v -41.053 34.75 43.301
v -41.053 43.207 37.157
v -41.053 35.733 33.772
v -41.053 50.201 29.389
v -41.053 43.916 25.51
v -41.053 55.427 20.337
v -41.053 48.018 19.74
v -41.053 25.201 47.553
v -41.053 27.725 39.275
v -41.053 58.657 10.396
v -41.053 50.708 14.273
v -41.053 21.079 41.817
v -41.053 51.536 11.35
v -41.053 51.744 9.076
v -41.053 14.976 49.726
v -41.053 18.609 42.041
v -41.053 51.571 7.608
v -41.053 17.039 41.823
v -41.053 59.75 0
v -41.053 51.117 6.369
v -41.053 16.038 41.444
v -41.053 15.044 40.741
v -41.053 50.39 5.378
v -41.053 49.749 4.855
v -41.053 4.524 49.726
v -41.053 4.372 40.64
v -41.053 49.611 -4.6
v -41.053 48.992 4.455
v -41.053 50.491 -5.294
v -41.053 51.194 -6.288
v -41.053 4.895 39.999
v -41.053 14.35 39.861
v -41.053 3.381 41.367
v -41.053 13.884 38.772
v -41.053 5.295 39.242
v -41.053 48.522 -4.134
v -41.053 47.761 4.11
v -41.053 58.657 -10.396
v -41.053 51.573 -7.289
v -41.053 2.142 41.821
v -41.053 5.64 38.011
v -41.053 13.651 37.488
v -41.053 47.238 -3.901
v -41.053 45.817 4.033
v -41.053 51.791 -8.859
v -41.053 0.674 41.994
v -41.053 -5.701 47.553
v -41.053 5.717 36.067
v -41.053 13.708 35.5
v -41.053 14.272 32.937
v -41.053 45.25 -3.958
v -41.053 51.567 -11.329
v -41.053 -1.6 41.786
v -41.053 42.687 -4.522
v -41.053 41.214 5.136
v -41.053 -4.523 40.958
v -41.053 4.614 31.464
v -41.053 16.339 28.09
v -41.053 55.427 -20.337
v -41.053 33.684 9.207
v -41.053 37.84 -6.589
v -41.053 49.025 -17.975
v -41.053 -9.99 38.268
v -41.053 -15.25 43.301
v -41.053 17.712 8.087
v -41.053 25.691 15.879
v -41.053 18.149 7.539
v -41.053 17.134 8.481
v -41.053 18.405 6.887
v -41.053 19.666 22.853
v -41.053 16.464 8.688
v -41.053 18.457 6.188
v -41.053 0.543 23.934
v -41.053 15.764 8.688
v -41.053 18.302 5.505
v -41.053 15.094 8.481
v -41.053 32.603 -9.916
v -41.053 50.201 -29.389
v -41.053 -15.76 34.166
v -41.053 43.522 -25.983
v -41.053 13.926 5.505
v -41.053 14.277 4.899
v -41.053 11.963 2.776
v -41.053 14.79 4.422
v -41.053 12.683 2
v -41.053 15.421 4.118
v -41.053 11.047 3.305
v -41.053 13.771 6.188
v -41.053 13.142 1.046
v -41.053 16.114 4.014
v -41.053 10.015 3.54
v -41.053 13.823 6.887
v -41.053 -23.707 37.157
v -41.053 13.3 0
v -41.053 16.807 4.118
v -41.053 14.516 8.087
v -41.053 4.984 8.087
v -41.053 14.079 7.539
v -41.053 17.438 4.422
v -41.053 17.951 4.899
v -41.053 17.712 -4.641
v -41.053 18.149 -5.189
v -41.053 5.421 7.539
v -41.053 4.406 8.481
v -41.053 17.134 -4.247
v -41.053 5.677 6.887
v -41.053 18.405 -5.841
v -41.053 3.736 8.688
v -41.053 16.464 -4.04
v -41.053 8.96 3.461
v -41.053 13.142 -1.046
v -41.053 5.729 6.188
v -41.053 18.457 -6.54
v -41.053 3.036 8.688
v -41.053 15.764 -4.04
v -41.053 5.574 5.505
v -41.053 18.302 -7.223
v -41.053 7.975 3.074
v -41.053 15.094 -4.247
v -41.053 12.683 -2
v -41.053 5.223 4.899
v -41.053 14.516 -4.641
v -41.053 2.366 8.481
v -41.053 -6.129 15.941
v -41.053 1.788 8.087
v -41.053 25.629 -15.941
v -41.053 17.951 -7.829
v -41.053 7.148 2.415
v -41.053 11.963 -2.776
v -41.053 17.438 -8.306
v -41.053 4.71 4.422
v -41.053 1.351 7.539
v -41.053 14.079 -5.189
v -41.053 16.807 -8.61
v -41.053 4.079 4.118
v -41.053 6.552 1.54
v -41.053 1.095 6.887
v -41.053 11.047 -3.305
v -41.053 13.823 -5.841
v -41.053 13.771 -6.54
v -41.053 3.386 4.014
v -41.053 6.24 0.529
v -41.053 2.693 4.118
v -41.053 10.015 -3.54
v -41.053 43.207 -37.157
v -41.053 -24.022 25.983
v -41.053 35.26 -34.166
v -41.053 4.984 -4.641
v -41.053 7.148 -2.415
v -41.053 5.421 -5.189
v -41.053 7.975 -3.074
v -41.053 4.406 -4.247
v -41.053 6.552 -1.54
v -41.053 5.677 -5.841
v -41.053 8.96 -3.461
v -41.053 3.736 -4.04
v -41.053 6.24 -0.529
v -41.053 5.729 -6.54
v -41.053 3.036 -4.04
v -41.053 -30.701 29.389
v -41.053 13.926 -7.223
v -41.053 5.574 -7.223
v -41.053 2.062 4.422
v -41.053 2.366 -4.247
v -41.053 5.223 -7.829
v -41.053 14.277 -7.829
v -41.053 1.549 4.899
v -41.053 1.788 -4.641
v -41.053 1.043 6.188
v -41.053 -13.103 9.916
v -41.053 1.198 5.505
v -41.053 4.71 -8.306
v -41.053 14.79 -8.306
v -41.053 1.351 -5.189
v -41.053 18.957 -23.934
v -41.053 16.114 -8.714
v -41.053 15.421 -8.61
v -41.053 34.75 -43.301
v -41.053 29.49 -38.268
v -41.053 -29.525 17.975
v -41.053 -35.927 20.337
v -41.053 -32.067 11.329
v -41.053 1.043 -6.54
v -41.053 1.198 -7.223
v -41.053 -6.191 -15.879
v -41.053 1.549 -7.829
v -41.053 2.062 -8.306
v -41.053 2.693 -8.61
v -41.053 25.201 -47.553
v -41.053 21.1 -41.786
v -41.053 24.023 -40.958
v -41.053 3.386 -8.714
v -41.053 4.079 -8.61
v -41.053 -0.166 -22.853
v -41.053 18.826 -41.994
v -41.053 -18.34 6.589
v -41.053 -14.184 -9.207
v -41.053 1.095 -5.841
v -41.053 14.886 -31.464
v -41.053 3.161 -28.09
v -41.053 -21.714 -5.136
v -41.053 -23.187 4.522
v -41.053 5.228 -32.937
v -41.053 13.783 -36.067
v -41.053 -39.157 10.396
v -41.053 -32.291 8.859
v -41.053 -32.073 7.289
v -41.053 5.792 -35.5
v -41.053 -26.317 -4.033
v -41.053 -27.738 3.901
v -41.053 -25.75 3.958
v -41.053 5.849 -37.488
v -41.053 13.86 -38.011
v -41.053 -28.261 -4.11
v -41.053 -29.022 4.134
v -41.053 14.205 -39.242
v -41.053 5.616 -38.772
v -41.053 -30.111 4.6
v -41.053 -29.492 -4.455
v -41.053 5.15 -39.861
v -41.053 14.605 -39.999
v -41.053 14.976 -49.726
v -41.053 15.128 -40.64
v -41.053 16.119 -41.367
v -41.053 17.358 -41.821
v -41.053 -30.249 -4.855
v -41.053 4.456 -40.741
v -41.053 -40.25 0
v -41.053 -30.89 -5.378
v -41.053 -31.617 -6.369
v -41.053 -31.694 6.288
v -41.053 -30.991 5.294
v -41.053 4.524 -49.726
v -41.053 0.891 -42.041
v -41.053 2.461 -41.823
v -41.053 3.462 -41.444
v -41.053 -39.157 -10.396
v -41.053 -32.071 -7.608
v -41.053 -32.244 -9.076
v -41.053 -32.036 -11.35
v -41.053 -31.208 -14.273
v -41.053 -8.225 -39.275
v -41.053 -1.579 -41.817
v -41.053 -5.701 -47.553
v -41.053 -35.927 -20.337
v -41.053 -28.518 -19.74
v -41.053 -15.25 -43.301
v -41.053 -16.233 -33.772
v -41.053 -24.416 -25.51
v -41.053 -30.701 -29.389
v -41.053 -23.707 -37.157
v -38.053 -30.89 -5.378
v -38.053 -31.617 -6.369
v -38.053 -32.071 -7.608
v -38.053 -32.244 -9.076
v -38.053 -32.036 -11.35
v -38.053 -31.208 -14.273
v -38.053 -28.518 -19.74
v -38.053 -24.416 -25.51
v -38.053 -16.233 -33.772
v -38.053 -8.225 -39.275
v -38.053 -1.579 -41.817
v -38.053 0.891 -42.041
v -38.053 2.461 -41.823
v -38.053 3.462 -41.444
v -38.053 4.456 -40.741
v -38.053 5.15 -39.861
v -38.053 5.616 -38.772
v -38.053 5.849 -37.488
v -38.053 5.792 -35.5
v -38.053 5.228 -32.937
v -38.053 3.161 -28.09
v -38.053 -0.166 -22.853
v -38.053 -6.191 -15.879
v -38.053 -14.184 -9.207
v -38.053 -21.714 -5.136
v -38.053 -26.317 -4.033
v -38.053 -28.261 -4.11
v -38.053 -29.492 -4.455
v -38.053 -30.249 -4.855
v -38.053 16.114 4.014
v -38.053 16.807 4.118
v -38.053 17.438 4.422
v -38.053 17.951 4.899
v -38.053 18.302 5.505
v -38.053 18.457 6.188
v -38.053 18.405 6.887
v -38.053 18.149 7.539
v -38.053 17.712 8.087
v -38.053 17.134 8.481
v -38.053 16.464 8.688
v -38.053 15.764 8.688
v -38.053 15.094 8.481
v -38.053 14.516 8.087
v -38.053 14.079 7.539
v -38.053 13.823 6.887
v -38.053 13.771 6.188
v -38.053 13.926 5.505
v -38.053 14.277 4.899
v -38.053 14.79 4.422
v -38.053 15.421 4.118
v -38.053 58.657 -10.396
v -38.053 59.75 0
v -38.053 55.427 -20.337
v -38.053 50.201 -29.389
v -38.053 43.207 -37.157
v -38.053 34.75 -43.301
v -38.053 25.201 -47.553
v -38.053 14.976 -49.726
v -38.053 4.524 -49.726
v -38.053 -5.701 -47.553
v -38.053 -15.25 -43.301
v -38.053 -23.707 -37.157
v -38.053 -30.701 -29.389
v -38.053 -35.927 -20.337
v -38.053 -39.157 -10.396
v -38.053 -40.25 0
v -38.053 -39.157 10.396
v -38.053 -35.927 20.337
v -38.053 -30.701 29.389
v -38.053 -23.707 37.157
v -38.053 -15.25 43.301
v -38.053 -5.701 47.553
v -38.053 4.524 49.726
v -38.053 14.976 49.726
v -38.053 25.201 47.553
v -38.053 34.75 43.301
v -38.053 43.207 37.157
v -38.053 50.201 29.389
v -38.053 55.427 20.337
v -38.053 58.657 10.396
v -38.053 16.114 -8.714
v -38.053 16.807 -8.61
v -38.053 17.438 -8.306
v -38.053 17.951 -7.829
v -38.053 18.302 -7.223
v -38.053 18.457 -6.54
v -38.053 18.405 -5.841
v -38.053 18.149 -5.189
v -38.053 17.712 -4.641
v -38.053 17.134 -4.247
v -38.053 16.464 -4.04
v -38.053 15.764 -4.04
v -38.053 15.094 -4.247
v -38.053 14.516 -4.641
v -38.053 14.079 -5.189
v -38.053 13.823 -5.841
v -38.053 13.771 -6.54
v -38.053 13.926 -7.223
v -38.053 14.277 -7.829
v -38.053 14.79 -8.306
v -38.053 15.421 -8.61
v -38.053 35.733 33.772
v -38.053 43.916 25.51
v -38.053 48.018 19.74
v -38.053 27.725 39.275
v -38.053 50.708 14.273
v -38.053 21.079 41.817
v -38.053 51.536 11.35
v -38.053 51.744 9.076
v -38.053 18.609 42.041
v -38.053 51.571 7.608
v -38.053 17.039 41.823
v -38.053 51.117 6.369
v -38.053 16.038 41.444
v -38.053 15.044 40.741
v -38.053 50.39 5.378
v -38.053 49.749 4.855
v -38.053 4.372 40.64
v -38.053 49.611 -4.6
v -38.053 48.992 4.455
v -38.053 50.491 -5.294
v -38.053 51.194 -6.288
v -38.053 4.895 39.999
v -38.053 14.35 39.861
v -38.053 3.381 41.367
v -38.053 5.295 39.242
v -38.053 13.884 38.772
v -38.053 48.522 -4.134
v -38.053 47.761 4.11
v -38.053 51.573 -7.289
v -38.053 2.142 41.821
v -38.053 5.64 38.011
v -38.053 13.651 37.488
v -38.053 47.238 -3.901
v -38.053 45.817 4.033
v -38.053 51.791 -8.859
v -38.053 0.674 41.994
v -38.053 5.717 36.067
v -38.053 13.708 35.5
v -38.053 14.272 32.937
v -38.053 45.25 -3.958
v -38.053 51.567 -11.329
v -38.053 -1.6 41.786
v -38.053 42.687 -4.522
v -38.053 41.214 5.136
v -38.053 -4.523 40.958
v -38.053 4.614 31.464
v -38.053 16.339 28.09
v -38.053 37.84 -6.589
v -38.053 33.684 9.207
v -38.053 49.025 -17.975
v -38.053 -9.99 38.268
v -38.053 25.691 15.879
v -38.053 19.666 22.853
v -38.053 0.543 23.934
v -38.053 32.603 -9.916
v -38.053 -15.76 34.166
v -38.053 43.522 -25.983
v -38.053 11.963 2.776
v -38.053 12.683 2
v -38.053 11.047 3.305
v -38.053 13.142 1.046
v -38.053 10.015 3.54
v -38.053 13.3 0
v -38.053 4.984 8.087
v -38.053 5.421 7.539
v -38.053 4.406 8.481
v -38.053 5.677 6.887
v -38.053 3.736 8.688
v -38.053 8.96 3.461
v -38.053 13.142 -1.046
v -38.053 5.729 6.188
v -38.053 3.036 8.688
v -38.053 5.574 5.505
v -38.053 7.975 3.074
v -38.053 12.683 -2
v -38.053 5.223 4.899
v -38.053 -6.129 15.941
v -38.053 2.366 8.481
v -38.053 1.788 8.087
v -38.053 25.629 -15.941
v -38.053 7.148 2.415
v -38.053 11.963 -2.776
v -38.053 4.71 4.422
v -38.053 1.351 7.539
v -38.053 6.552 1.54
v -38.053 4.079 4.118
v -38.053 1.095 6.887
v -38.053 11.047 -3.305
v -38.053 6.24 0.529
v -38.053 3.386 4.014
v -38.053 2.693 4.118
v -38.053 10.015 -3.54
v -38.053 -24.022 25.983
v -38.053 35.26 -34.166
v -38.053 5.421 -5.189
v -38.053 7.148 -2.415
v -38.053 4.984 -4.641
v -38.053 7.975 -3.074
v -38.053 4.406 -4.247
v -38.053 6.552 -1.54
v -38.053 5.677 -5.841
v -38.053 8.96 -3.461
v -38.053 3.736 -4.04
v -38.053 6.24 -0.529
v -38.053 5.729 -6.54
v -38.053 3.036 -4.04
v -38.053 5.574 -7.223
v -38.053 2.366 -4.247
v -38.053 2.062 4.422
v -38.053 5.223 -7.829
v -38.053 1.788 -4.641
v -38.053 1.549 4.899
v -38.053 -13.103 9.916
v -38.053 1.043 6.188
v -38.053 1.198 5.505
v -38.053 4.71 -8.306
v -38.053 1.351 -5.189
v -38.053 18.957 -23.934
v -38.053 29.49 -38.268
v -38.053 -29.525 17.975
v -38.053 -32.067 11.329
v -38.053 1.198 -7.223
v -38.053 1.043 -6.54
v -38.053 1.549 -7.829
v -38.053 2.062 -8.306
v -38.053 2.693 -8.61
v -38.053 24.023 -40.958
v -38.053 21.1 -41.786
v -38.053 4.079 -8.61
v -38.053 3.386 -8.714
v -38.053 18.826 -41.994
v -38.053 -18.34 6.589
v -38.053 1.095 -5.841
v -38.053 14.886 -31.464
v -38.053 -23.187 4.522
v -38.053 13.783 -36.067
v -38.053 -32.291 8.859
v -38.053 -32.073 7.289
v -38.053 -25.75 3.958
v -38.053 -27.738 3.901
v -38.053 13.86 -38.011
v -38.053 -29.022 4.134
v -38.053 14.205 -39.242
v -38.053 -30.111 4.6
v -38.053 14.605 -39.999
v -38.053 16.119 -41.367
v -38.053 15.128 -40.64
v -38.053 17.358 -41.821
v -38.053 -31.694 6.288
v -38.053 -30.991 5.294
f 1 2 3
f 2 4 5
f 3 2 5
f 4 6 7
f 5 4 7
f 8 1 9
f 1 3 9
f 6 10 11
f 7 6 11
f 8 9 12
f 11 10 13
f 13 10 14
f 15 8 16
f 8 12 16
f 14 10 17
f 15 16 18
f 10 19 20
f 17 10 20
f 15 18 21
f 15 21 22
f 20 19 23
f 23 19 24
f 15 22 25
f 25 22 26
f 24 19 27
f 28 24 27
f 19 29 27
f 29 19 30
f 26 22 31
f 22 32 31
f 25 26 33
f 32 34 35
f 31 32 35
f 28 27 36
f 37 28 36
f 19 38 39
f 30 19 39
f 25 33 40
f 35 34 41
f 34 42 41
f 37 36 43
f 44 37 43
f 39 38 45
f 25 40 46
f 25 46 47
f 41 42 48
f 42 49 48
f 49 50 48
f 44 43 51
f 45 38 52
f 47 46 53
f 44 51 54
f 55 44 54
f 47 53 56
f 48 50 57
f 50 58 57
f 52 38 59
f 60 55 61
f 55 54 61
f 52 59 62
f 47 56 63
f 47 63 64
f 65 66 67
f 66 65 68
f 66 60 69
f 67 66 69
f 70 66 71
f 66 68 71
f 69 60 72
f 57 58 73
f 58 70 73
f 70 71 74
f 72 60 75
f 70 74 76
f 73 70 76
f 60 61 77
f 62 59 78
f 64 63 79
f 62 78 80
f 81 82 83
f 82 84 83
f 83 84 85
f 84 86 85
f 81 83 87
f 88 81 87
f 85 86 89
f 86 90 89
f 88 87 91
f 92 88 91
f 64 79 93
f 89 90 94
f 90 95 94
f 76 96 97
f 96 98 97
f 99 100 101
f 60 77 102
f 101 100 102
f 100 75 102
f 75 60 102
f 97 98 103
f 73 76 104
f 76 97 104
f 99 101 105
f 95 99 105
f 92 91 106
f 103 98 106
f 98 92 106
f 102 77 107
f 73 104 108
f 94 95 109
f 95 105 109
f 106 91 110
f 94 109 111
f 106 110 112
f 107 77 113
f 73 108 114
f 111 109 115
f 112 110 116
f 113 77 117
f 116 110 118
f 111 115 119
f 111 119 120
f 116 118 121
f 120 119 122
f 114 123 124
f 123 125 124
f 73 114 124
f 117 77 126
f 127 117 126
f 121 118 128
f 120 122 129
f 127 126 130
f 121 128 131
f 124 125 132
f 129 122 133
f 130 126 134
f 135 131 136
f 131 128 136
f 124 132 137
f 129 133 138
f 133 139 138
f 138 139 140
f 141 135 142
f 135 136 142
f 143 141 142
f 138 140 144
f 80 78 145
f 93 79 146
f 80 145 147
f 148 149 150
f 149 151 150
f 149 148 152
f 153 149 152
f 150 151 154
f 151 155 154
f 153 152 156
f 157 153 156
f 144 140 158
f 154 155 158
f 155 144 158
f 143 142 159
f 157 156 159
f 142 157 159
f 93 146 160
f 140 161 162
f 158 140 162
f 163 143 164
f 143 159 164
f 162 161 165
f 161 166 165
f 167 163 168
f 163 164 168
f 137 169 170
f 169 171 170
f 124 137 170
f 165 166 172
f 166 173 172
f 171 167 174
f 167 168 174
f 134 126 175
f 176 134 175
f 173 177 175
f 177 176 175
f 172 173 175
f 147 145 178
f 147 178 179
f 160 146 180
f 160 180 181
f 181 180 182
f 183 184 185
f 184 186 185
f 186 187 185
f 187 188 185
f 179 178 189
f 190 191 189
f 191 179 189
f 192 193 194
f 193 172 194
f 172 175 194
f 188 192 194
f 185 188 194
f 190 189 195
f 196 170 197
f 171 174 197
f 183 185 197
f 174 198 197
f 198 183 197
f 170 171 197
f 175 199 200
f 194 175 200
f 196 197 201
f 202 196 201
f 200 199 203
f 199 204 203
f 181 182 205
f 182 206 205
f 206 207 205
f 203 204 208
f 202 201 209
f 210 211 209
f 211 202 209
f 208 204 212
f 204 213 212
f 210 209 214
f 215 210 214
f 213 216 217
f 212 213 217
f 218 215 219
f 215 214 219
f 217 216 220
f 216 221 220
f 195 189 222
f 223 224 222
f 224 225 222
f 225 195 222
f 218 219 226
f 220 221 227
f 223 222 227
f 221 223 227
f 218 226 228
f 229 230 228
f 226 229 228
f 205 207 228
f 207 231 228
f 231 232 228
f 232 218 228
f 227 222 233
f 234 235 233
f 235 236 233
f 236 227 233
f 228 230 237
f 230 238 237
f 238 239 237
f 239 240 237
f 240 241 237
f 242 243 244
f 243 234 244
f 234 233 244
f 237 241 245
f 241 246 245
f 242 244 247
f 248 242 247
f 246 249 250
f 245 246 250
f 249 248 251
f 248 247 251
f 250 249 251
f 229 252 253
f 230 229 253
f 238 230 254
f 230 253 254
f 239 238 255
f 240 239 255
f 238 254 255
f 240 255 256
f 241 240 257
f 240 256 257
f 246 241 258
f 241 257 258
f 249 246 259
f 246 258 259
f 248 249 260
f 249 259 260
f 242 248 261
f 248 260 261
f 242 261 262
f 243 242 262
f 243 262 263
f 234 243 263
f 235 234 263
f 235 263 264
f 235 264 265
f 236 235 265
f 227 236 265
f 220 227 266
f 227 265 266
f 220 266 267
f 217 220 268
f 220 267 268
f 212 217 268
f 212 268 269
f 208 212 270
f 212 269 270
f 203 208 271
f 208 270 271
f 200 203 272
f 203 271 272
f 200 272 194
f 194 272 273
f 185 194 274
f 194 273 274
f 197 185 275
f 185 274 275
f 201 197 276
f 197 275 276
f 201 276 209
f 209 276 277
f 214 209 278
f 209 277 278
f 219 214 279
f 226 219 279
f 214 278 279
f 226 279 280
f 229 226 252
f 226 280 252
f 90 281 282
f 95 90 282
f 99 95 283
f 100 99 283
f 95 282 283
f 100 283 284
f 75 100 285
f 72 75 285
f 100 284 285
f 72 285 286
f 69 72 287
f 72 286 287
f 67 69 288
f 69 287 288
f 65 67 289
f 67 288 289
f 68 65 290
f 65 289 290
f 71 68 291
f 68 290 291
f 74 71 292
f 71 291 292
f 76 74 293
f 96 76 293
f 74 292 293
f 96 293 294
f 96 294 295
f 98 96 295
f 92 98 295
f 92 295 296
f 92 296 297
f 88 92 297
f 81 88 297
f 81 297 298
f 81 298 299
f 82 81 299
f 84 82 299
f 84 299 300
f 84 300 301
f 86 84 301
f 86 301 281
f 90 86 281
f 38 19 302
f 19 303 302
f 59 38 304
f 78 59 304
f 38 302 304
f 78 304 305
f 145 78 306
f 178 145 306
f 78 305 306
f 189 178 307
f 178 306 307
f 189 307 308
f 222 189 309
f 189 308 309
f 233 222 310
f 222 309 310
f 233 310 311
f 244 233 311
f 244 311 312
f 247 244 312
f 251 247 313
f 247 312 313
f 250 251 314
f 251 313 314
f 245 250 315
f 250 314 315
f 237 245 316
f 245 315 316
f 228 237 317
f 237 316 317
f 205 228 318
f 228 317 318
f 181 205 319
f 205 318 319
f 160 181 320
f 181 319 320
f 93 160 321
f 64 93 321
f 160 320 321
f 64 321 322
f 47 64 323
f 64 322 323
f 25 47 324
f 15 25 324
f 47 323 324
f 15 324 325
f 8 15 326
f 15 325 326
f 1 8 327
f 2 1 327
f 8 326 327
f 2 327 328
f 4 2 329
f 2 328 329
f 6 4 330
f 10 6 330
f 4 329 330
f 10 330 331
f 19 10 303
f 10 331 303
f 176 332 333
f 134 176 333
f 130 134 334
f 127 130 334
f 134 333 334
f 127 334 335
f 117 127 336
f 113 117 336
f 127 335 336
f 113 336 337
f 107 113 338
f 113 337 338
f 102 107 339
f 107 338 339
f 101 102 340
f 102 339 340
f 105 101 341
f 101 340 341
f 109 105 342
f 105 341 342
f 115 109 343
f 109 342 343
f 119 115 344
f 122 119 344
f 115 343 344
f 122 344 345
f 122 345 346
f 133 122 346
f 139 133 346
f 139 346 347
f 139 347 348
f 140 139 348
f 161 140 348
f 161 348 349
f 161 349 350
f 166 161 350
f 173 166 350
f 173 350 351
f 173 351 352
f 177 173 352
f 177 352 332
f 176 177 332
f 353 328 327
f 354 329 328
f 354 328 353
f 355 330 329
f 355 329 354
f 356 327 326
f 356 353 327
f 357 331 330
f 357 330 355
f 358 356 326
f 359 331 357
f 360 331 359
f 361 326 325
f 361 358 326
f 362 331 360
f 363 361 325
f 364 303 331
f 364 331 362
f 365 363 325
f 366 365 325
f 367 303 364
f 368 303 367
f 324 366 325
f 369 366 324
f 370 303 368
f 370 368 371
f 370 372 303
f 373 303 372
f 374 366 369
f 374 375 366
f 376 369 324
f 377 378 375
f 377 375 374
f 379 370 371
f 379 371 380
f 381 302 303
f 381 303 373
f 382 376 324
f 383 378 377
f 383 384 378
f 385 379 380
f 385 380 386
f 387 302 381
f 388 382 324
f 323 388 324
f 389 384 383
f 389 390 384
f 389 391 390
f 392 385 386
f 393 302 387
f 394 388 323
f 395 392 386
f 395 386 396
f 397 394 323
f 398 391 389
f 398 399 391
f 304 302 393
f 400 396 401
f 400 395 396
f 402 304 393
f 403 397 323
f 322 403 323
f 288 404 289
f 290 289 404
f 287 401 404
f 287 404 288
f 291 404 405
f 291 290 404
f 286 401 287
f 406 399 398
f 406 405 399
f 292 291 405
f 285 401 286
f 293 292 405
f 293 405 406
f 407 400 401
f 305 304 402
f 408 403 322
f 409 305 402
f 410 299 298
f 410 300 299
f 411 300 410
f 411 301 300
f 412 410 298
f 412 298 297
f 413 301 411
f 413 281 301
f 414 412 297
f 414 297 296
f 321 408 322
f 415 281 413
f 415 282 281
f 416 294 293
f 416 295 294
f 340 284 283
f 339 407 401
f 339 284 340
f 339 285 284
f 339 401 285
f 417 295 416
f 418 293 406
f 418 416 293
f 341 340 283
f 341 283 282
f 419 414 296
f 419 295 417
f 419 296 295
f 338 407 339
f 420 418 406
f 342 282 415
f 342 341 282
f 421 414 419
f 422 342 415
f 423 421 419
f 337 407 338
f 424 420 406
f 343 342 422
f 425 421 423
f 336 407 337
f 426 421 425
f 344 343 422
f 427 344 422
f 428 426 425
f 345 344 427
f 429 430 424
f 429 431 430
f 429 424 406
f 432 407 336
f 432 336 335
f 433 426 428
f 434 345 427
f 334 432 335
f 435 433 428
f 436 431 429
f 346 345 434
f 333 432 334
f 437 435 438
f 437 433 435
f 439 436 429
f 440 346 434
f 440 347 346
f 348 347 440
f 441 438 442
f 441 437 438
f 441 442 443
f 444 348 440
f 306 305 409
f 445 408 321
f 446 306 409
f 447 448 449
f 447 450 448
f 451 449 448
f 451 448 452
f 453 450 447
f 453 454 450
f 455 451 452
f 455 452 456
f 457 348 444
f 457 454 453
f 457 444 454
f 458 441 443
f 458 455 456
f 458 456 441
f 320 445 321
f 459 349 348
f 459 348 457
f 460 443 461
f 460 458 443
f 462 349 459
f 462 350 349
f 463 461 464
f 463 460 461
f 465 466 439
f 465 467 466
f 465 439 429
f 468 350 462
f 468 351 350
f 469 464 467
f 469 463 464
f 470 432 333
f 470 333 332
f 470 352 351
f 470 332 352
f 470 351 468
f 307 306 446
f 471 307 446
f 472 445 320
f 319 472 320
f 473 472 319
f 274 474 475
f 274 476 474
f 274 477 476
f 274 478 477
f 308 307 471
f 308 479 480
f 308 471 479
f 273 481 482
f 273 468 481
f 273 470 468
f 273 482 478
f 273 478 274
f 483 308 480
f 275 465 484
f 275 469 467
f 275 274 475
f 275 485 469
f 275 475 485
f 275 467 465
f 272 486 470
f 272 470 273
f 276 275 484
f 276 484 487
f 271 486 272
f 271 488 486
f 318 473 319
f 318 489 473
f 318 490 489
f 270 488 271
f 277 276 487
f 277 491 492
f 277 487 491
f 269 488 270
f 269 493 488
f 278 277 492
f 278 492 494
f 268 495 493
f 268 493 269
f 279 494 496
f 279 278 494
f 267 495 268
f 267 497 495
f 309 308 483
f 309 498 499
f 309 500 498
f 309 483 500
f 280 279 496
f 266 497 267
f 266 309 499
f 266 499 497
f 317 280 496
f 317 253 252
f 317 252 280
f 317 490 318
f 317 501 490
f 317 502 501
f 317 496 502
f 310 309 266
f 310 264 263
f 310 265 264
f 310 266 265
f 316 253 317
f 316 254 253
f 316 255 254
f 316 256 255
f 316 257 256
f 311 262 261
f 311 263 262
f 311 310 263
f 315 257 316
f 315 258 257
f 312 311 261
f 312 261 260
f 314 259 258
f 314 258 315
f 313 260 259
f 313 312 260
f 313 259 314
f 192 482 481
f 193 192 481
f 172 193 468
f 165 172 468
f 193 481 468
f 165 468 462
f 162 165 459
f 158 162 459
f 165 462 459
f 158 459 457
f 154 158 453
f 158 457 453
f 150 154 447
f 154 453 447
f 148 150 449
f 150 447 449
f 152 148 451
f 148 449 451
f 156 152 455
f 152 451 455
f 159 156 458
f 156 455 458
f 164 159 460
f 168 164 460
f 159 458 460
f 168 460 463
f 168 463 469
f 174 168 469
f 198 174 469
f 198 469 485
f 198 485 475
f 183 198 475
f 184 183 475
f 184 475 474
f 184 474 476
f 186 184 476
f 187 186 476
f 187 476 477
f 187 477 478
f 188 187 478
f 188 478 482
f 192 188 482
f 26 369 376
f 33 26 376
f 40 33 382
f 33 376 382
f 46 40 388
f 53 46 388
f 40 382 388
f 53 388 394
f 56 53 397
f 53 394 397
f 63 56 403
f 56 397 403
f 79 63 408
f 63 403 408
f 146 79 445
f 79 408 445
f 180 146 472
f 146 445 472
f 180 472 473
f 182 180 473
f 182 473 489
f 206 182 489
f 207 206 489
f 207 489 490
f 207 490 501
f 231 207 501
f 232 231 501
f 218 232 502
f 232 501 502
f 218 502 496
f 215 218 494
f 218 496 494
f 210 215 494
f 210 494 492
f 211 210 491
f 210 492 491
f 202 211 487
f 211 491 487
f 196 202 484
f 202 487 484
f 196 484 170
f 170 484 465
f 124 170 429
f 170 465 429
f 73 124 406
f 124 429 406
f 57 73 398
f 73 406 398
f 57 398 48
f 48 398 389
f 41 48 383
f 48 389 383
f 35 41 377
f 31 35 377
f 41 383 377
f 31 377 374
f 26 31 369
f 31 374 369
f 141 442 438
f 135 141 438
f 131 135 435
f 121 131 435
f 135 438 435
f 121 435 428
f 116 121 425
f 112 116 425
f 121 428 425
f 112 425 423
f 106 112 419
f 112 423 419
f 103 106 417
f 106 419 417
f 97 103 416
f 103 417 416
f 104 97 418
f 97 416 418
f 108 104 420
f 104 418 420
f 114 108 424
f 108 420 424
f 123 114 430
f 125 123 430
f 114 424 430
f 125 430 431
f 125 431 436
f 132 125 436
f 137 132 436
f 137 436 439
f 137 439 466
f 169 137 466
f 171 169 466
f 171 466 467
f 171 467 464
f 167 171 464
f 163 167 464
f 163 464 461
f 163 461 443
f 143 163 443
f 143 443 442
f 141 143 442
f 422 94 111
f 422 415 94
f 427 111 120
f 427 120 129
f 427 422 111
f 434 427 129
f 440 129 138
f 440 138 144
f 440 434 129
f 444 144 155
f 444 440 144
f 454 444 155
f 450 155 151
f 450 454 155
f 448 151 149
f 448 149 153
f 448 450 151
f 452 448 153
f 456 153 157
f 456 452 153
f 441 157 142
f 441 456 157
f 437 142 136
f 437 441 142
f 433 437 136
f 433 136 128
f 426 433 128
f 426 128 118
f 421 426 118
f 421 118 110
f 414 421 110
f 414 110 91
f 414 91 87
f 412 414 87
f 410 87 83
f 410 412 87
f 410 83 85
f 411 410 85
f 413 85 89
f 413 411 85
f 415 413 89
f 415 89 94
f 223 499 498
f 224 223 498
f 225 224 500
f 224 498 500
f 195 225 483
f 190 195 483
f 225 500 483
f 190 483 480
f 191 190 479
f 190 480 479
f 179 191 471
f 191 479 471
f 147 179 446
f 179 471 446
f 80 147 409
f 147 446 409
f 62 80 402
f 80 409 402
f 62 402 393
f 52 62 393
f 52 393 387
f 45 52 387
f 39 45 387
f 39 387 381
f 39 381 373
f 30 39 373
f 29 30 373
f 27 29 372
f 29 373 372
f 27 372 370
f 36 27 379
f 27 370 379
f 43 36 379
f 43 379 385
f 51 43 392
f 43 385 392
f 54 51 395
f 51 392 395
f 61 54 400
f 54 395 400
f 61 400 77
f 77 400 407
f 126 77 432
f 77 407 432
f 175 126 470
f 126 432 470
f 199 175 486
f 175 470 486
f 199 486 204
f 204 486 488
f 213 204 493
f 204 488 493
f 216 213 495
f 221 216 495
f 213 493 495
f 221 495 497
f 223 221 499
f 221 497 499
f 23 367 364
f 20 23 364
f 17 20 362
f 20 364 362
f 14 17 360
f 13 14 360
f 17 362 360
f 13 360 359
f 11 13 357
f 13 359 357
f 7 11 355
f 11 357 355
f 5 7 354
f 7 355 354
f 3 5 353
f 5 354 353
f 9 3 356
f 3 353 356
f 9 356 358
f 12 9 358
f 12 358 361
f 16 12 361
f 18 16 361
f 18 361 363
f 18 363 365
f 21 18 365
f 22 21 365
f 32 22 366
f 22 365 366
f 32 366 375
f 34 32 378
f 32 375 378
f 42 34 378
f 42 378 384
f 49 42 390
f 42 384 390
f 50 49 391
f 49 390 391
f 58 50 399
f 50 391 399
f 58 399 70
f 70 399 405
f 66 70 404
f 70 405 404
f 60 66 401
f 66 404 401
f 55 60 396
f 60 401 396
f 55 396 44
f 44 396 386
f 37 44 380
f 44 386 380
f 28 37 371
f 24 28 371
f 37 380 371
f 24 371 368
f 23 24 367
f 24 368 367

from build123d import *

# Parameters (mm, degrees)
SKIZZE1_W                        = 3
SKIZZE1_H                        = 46.45
F_4_7_4_7_DURCHMESSER_BOHRUNG1_D = 4.7
SKIZZE5_RX                       = 25
SKIZZE5_RY                       = 10
SCHNITT_LINEAR_AUSTRAGEN1_DEPTH  = 3
KREISMUSTER1_COUNT               = 4


with BuildPart() as part:
    # Skizze1 → Rotation1 (revolve)
    with BuildSketch(Plane.XY):
        with Locations((-39.553372853, 36.525)):
            Rectangle(SKIZZE1_W, SKIZZE1_H)
    revolve(axis=Axis((-17.6629112, 9.75, 0), (-1, 0, 0)))

    # Ø4.7 (4.7) Durchmesser Bohrung1 (through all)
    with Locations(Plane(origin=(-41.053372853, 11.968723204, 19.868936148), x_dir=(0, 0, 1), z_dir=(-1, 0, 0))):
        with Locations((-13.504975118, -8.582684234), (-26.232897179, -8.582684234), (-26.232897179, 4.145237827), (-13.504975118, 4.145237827)):
            Hole(F_4_7_4_7_DURCHMESSER_BOHRUNG1_D / 2)

    # Skizze5 → Schnitt-Linear austragen1 (cut)
    with BuildSketch(Plane(origin=(-38.053372853, 0, 0), x_dir=(0, 0, -1), z_dir=(1, 0, 0))):
        with Locations(Location((-23.027329597, 32.684515508), (0, 0, 45.090609512))):
            Ellipse(SKIZZE5_RX, SKIZZE5_RY)
    schnitt_linear_austragen1 = extrude(amount=-SCHNITT_LINEAR_AUSTRAGEN1_DEPTH, mode=Mode.SUBTRACT)

    # Kreismuster1: Schnitt-Linear austragen1 ×4 about axis
    kreismuster1_axis = Axis((0, 9.75, 0), (-1, 0, 0))
    for i in range(1, KREISMUSTER1_COUNT):
        add(schnitt_linear_austragen1.rotate(kreismuster1_axis, i * 360 / KREISMUSTER1_COUNT), mode=Mode.SUBTRACT)


solid = part.part
